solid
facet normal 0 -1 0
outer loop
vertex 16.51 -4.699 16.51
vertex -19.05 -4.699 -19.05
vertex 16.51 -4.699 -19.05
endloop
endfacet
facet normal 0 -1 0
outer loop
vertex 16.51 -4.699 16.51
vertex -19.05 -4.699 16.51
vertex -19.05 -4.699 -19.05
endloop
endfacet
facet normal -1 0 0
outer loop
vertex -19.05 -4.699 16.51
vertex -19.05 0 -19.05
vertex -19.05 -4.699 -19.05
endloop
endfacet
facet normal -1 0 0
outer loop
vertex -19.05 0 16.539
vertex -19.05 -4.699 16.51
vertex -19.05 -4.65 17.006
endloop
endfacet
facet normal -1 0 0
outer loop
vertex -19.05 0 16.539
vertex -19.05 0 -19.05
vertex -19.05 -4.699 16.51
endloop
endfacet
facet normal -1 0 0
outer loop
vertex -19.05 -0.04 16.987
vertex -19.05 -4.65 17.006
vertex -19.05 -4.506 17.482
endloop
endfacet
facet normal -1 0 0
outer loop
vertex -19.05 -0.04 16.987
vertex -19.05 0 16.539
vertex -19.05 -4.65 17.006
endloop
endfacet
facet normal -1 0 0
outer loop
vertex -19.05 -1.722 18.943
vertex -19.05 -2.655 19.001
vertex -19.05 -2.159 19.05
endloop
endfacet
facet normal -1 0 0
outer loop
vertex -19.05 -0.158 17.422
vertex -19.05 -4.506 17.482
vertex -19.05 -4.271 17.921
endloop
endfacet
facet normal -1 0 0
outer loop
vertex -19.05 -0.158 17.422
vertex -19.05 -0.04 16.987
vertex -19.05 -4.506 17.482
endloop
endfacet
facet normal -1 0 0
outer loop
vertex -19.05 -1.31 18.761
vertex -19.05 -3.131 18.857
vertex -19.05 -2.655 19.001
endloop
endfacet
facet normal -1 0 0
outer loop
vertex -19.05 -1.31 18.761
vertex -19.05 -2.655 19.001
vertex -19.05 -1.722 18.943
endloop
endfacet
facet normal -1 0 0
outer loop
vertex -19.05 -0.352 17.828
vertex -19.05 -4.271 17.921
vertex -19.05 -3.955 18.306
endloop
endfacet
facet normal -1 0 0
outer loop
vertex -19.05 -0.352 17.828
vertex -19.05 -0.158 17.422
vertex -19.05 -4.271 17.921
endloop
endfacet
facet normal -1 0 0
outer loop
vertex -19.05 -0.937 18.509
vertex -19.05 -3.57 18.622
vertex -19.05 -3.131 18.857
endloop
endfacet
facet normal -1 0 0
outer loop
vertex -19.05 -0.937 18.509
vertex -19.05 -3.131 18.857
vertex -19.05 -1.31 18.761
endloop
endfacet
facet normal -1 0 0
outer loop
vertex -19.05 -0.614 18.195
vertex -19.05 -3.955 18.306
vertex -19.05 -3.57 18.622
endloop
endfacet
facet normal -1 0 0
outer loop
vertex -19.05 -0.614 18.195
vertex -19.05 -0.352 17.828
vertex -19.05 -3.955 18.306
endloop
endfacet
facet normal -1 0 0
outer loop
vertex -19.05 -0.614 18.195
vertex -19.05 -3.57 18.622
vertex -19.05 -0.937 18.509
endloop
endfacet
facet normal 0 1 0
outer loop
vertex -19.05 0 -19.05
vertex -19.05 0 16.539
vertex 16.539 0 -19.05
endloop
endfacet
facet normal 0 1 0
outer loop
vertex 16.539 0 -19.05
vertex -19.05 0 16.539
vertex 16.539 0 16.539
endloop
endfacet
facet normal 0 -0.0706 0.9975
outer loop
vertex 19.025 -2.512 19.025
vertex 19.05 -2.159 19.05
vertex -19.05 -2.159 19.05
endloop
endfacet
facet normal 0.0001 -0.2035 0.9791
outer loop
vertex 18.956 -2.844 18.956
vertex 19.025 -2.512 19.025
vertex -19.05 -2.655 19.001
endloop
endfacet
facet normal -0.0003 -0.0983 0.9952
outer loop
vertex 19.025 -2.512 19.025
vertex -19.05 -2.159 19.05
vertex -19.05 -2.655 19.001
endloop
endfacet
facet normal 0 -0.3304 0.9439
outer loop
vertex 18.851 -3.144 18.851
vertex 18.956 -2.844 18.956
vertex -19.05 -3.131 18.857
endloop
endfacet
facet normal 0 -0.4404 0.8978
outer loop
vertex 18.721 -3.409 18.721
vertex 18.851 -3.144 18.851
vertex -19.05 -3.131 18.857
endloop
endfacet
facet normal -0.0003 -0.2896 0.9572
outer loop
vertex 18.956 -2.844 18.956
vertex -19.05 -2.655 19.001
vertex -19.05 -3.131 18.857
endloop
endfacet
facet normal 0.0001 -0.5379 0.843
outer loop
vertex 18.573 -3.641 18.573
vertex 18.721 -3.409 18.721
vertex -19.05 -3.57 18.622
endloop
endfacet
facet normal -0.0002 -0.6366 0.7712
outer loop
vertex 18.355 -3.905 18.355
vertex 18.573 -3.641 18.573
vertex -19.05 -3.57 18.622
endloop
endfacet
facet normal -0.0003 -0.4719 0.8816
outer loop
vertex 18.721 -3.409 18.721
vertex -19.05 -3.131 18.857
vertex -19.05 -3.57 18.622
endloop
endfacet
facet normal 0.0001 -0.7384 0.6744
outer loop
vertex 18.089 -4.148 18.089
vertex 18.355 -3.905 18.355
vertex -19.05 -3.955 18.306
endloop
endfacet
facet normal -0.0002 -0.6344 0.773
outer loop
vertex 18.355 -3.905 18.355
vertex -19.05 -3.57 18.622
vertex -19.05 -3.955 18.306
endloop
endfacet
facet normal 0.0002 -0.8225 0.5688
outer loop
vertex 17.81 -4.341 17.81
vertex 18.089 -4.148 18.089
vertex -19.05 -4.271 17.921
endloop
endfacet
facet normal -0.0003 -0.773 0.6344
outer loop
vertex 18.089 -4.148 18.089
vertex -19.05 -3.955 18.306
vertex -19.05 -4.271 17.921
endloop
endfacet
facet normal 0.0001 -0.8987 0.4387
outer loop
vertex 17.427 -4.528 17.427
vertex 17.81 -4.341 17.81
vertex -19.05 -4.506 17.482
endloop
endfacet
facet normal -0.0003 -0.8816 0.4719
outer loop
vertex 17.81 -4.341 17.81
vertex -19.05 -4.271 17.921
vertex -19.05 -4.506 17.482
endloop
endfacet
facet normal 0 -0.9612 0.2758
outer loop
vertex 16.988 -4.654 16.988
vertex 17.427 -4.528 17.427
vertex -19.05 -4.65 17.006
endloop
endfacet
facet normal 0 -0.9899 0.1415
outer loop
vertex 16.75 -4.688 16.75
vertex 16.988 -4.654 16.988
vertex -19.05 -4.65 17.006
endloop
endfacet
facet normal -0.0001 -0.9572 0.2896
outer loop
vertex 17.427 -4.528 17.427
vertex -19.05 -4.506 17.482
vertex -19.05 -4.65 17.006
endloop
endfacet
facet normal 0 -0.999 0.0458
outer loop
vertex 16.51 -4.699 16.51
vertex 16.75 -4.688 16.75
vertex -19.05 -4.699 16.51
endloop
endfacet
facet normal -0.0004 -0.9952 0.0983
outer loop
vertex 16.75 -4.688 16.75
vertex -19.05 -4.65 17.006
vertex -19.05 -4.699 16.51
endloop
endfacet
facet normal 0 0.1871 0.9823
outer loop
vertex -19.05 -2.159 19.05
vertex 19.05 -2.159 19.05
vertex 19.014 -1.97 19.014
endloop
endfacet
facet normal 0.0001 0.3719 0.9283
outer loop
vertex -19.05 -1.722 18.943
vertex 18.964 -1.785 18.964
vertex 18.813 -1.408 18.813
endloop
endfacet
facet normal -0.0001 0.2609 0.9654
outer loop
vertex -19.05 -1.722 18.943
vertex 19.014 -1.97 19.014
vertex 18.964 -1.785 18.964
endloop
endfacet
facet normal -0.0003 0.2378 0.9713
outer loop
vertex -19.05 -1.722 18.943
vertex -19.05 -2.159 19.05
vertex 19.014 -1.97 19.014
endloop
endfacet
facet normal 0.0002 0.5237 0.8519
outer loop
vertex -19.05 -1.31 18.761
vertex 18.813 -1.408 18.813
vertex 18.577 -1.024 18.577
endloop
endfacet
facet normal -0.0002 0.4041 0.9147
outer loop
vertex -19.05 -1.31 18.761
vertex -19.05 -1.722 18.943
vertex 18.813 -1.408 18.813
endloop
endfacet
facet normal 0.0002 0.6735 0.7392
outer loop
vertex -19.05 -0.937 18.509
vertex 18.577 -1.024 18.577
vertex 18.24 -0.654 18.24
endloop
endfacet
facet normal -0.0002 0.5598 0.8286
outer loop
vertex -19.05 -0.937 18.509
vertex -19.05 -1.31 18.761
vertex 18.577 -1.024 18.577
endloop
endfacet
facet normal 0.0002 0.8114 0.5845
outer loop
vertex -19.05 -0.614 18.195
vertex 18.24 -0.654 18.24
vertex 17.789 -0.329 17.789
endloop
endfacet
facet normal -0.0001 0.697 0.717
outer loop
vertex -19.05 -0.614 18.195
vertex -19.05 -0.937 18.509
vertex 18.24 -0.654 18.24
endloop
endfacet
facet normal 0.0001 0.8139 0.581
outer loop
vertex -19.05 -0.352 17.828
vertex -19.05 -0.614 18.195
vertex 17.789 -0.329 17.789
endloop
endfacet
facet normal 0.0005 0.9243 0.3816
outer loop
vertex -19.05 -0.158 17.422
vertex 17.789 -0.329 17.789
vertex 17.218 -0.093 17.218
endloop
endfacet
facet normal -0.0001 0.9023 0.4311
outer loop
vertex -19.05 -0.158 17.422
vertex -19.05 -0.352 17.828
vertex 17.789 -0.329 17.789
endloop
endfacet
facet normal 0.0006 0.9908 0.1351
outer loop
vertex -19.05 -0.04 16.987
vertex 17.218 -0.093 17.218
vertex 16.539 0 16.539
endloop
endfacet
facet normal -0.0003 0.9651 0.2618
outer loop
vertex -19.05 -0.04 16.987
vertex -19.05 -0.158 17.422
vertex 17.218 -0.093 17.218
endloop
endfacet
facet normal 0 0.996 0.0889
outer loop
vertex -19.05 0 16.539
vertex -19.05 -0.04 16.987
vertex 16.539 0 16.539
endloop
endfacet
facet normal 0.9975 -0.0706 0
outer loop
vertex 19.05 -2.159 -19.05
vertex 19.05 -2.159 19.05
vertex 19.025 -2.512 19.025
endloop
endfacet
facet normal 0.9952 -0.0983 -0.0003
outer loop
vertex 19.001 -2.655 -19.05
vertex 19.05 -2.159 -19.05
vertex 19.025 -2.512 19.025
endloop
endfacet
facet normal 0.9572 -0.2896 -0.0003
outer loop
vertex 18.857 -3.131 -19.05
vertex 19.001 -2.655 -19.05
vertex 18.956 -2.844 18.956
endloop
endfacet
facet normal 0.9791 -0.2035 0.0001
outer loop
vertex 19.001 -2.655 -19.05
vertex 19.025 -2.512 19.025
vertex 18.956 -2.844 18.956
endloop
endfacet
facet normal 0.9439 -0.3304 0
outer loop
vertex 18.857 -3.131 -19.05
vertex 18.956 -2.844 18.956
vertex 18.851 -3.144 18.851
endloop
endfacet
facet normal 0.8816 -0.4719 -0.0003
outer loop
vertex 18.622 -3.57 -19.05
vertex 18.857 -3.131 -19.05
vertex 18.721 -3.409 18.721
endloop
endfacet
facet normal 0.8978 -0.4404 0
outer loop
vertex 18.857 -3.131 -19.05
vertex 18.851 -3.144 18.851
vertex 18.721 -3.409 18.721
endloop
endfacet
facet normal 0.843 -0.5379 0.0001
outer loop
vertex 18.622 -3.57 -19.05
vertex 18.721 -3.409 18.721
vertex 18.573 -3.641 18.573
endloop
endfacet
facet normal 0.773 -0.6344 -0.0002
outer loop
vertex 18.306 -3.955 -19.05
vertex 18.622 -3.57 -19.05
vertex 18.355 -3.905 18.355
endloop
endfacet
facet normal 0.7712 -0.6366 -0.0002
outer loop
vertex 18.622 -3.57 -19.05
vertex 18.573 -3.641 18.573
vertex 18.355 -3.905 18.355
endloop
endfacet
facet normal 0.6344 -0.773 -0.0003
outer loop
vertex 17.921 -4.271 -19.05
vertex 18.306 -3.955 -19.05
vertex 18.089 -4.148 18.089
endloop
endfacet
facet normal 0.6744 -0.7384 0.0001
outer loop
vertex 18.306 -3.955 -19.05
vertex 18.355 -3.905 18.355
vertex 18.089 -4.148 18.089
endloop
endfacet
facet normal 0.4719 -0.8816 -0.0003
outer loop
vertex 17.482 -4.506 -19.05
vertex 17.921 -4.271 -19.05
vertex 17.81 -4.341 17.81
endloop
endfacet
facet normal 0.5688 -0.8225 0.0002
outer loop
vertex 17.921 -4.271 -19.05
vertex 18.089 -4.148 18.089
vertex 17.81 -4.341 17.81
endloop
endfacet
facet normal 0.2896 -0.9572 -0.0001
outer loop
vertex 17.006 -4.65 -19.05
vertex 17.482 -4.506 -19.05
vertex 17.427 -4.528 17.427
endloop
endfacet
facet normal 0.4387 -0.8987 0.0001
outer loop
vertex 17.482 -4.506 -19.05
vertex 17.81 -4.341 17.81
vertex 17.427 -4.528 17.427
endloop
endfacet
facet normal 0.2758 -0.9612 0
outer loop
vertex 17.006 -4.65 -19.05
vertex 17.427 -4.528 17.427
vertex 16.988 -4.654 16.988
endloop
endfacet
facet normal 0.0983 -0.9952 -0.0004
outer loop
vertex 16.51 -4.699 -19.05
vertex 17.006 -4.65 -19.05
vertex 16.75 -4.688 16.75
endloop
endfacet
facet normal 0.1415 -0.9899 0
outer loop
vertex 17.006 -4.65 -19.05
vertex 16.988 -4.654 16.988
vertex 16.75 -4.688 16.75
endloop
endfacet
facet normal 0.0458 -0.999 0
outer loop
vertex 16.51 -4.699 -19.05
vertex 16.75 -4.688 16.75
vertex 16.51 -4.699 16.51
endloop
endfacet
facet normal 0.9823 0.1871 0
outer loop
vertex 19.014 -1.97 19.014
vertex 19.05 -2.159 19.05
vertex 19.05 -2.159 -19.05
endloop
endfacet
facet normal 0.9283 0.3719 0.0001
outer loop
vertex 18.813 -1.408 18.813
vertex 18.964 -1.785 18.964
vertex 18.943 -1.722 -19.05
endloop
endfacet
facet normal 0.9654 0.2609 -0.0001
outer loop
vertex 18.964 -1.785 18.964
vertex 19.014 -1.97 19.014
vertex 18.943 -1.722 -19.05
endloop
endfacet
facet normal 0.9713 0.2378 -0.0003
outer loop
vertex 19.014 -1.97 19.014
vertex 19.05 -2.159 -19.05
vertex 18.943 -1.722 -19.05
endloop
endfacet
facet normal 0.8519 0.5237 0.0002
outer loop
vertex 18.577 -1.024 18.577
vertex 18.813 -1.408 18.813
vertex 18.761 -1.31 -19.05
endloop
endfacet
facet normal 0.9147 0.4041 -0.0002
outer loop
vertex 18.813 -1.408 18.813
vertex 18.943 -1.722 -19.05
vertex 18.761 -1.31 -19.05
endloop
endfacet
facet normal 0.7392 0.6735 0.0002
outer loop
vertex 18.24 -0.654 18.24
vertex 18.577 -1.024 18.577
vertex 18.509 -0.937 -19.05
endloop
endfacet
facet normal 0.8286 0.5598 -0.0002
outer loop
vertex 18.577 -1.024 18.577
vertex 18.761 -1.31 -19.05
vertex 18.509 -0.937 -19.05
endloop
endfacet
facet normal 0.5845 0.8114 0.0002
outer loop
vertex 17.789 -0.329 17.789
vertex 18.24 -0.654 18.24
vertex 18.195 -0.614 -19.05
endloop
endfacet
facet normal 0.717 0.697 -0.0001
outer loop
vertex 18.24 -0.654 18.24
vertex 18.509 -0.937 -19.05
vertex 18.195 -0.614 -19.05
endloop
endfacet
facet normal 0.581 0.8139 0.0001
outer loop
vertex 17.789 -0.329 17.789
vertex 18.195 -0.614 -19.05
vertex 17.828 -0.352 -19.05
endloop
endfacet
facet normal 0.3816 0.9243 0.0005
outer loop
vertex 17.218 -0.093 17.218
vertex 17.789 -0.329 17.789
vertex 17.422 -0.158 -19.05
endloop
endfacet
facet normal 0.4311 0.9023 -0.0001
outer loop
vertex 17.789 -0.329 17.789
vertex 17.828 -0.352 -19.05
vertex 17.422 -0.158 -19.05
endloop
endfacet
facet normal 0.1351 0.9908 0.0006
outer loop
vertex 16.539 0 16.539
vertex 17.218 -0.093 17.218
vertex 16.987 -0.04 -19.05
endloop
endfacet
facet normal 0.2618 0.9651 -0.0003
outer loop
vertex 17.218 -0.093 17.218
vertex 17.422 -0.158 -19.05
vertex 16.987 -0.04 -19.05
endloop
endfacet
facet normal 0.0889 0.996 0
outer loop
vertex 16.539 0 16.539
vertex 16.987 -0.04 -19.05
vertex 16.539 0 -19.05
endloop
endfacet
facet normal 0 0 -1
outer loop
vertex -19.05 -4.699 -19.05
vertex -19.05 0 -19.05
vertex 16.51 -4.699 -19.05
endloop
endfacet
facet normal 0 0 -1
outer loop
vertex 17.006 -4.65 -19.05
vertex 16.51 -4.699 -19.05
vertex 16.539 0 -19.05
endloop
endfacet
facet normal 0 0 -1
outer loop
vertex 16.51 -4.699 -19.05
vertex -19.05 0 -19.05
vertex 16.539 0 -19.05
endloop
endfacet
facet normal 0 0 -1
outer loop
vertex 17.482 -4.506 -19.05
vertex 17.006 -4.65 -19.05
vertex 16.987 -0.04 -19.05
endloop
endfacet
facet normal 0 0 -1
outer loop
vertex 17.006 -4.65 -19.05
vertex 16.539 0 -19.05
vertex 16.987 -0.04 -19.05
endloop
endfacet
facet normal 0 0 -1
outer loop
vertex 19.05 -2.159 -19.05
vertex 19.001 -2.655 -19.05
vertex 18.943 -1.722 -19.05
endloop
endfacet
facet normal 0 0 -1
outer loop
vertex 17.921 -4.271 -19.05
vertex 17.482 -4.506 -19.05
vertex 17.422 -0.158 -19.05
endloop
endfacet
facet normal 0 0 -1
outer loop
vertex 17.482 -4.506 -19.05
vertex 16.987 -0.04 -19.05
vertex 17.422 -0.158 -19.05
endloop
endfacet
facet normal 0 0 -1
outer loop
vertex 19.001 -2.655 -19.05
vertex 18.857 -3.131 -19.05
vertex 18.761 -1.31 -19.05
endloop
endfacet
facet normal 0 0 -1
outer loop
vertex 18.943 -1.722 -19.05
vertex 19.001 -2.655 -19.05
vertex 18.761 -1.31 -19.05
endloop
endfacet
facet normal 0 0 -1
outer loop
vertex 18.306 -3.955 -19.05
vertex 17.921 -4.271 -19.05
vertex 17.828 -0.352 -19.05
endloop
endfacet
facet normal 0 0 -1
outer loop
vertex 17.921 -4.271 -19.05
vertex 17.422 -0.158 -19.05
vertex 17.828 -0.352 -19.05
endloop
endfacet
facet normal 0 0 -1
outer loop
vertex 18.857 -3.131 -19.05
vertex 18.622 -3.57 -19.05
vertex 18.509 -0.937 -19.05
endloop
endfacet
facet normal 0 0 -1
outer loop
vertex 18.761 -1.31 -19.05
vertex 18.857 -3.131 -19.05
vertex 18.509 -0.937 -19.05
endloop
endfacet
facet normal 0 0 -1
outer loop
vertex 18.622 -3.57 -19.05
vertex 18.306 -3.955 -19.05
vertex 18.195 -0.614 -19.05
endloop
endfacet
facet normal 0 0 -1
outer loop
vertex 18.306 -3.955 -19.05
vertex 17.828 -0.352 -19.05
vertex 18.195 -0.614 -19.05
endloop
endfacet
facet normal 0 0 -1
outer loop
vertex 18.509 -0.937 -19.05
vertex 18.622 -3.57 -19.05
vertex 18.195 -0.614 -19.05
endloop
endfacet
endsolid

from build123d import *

# Parameters (mm, degrees)
F0_W        = 38.1
F0_H        = 38.1
F1_DEPTH    = 4.699
F2_R        = 2.54
F3_T1_DEPTH = 50.6563121576
F4_T1_DEPTH = 48.26
F5_T1_DEPTH = 48.1450497261


# Not quite as in the source:
# - a fillet or chamfer that OpenCascade refuses, or shapes differently, is made with other operations: its cross-section is extruded or revolved along the edge and cut away or added


with BuildPart() as f1:
    # F0 (on Front) → F1 (new body)
    with BuildSketch(Plane.XZ):
        Rectangle(F0_W, F0_H)
    extrude(amount=F1_DEPTH)

    # F2
    f2_edges = [f1.edges().sort_by_distance(p)[0] for p in [
        (19.05, -4.699, 0),
    ]]
    fillet(f2_edges, radius=F2_R)

    # F3: fillet of radius 2.54 on 1 edges, made by hand

    # F3_s2 → F3_t1 (cut)
    with BuildSketch(Plane.XY.offset(-25.3281560788)):
        with BuildLine():
            ThreePointArc((19.05, -2.159), (18.1946149794, -0.6139496372), (16.5387375685, 0))
            Line((16.5387375685, 0), (19.05, 0))
            Line((19.05, 0), (19.05, -2.159))
        make_face()
    extrude(amount=F3_T1_DEPTH, mode=Mode.SUBTRACT)

    # F4: fillet of radius 2.54 on 1 edges, made by hand

    # F4_s2 → F4_t1 (cut)
    with BuildSketch(Plane.YZ.offset(-25.4)):
        with BuildLine():
            ThreePointArc((-2.159, 19.05), (-3.9550512242, 18.3060512242), (-4.699, 16.51))
            Line((-4.699, 16.51), (-4.699, 19.05))
            Line((-4.699, 19.05), (-2.159, 19.05))
        make_face()
    extrude(amount=F4_T1_DEPTH, mode=Mode.SUBTRACT)

    # F5: fillet of radius 2.54 on 1 edges, made by hand

    # F5_s2 → F5_t1 (cut)
    with BuildSketch(Plane.YZ.offset(-25.3281560788)):
        with BuildLine():
            ThreePointArc((-2.159, 19.05), (-0.6139496372, 18.1946149794), (0, 16.5387375685))
            Line((0, 16.5387375685), (0, 19.05))
            Line((0, 19.05), (-2.159, 19.05))
        make_face()
    extrude(amount=F5_T1_DEPTH, mode=Mode.SUBTRACT)


solid = f1.part
